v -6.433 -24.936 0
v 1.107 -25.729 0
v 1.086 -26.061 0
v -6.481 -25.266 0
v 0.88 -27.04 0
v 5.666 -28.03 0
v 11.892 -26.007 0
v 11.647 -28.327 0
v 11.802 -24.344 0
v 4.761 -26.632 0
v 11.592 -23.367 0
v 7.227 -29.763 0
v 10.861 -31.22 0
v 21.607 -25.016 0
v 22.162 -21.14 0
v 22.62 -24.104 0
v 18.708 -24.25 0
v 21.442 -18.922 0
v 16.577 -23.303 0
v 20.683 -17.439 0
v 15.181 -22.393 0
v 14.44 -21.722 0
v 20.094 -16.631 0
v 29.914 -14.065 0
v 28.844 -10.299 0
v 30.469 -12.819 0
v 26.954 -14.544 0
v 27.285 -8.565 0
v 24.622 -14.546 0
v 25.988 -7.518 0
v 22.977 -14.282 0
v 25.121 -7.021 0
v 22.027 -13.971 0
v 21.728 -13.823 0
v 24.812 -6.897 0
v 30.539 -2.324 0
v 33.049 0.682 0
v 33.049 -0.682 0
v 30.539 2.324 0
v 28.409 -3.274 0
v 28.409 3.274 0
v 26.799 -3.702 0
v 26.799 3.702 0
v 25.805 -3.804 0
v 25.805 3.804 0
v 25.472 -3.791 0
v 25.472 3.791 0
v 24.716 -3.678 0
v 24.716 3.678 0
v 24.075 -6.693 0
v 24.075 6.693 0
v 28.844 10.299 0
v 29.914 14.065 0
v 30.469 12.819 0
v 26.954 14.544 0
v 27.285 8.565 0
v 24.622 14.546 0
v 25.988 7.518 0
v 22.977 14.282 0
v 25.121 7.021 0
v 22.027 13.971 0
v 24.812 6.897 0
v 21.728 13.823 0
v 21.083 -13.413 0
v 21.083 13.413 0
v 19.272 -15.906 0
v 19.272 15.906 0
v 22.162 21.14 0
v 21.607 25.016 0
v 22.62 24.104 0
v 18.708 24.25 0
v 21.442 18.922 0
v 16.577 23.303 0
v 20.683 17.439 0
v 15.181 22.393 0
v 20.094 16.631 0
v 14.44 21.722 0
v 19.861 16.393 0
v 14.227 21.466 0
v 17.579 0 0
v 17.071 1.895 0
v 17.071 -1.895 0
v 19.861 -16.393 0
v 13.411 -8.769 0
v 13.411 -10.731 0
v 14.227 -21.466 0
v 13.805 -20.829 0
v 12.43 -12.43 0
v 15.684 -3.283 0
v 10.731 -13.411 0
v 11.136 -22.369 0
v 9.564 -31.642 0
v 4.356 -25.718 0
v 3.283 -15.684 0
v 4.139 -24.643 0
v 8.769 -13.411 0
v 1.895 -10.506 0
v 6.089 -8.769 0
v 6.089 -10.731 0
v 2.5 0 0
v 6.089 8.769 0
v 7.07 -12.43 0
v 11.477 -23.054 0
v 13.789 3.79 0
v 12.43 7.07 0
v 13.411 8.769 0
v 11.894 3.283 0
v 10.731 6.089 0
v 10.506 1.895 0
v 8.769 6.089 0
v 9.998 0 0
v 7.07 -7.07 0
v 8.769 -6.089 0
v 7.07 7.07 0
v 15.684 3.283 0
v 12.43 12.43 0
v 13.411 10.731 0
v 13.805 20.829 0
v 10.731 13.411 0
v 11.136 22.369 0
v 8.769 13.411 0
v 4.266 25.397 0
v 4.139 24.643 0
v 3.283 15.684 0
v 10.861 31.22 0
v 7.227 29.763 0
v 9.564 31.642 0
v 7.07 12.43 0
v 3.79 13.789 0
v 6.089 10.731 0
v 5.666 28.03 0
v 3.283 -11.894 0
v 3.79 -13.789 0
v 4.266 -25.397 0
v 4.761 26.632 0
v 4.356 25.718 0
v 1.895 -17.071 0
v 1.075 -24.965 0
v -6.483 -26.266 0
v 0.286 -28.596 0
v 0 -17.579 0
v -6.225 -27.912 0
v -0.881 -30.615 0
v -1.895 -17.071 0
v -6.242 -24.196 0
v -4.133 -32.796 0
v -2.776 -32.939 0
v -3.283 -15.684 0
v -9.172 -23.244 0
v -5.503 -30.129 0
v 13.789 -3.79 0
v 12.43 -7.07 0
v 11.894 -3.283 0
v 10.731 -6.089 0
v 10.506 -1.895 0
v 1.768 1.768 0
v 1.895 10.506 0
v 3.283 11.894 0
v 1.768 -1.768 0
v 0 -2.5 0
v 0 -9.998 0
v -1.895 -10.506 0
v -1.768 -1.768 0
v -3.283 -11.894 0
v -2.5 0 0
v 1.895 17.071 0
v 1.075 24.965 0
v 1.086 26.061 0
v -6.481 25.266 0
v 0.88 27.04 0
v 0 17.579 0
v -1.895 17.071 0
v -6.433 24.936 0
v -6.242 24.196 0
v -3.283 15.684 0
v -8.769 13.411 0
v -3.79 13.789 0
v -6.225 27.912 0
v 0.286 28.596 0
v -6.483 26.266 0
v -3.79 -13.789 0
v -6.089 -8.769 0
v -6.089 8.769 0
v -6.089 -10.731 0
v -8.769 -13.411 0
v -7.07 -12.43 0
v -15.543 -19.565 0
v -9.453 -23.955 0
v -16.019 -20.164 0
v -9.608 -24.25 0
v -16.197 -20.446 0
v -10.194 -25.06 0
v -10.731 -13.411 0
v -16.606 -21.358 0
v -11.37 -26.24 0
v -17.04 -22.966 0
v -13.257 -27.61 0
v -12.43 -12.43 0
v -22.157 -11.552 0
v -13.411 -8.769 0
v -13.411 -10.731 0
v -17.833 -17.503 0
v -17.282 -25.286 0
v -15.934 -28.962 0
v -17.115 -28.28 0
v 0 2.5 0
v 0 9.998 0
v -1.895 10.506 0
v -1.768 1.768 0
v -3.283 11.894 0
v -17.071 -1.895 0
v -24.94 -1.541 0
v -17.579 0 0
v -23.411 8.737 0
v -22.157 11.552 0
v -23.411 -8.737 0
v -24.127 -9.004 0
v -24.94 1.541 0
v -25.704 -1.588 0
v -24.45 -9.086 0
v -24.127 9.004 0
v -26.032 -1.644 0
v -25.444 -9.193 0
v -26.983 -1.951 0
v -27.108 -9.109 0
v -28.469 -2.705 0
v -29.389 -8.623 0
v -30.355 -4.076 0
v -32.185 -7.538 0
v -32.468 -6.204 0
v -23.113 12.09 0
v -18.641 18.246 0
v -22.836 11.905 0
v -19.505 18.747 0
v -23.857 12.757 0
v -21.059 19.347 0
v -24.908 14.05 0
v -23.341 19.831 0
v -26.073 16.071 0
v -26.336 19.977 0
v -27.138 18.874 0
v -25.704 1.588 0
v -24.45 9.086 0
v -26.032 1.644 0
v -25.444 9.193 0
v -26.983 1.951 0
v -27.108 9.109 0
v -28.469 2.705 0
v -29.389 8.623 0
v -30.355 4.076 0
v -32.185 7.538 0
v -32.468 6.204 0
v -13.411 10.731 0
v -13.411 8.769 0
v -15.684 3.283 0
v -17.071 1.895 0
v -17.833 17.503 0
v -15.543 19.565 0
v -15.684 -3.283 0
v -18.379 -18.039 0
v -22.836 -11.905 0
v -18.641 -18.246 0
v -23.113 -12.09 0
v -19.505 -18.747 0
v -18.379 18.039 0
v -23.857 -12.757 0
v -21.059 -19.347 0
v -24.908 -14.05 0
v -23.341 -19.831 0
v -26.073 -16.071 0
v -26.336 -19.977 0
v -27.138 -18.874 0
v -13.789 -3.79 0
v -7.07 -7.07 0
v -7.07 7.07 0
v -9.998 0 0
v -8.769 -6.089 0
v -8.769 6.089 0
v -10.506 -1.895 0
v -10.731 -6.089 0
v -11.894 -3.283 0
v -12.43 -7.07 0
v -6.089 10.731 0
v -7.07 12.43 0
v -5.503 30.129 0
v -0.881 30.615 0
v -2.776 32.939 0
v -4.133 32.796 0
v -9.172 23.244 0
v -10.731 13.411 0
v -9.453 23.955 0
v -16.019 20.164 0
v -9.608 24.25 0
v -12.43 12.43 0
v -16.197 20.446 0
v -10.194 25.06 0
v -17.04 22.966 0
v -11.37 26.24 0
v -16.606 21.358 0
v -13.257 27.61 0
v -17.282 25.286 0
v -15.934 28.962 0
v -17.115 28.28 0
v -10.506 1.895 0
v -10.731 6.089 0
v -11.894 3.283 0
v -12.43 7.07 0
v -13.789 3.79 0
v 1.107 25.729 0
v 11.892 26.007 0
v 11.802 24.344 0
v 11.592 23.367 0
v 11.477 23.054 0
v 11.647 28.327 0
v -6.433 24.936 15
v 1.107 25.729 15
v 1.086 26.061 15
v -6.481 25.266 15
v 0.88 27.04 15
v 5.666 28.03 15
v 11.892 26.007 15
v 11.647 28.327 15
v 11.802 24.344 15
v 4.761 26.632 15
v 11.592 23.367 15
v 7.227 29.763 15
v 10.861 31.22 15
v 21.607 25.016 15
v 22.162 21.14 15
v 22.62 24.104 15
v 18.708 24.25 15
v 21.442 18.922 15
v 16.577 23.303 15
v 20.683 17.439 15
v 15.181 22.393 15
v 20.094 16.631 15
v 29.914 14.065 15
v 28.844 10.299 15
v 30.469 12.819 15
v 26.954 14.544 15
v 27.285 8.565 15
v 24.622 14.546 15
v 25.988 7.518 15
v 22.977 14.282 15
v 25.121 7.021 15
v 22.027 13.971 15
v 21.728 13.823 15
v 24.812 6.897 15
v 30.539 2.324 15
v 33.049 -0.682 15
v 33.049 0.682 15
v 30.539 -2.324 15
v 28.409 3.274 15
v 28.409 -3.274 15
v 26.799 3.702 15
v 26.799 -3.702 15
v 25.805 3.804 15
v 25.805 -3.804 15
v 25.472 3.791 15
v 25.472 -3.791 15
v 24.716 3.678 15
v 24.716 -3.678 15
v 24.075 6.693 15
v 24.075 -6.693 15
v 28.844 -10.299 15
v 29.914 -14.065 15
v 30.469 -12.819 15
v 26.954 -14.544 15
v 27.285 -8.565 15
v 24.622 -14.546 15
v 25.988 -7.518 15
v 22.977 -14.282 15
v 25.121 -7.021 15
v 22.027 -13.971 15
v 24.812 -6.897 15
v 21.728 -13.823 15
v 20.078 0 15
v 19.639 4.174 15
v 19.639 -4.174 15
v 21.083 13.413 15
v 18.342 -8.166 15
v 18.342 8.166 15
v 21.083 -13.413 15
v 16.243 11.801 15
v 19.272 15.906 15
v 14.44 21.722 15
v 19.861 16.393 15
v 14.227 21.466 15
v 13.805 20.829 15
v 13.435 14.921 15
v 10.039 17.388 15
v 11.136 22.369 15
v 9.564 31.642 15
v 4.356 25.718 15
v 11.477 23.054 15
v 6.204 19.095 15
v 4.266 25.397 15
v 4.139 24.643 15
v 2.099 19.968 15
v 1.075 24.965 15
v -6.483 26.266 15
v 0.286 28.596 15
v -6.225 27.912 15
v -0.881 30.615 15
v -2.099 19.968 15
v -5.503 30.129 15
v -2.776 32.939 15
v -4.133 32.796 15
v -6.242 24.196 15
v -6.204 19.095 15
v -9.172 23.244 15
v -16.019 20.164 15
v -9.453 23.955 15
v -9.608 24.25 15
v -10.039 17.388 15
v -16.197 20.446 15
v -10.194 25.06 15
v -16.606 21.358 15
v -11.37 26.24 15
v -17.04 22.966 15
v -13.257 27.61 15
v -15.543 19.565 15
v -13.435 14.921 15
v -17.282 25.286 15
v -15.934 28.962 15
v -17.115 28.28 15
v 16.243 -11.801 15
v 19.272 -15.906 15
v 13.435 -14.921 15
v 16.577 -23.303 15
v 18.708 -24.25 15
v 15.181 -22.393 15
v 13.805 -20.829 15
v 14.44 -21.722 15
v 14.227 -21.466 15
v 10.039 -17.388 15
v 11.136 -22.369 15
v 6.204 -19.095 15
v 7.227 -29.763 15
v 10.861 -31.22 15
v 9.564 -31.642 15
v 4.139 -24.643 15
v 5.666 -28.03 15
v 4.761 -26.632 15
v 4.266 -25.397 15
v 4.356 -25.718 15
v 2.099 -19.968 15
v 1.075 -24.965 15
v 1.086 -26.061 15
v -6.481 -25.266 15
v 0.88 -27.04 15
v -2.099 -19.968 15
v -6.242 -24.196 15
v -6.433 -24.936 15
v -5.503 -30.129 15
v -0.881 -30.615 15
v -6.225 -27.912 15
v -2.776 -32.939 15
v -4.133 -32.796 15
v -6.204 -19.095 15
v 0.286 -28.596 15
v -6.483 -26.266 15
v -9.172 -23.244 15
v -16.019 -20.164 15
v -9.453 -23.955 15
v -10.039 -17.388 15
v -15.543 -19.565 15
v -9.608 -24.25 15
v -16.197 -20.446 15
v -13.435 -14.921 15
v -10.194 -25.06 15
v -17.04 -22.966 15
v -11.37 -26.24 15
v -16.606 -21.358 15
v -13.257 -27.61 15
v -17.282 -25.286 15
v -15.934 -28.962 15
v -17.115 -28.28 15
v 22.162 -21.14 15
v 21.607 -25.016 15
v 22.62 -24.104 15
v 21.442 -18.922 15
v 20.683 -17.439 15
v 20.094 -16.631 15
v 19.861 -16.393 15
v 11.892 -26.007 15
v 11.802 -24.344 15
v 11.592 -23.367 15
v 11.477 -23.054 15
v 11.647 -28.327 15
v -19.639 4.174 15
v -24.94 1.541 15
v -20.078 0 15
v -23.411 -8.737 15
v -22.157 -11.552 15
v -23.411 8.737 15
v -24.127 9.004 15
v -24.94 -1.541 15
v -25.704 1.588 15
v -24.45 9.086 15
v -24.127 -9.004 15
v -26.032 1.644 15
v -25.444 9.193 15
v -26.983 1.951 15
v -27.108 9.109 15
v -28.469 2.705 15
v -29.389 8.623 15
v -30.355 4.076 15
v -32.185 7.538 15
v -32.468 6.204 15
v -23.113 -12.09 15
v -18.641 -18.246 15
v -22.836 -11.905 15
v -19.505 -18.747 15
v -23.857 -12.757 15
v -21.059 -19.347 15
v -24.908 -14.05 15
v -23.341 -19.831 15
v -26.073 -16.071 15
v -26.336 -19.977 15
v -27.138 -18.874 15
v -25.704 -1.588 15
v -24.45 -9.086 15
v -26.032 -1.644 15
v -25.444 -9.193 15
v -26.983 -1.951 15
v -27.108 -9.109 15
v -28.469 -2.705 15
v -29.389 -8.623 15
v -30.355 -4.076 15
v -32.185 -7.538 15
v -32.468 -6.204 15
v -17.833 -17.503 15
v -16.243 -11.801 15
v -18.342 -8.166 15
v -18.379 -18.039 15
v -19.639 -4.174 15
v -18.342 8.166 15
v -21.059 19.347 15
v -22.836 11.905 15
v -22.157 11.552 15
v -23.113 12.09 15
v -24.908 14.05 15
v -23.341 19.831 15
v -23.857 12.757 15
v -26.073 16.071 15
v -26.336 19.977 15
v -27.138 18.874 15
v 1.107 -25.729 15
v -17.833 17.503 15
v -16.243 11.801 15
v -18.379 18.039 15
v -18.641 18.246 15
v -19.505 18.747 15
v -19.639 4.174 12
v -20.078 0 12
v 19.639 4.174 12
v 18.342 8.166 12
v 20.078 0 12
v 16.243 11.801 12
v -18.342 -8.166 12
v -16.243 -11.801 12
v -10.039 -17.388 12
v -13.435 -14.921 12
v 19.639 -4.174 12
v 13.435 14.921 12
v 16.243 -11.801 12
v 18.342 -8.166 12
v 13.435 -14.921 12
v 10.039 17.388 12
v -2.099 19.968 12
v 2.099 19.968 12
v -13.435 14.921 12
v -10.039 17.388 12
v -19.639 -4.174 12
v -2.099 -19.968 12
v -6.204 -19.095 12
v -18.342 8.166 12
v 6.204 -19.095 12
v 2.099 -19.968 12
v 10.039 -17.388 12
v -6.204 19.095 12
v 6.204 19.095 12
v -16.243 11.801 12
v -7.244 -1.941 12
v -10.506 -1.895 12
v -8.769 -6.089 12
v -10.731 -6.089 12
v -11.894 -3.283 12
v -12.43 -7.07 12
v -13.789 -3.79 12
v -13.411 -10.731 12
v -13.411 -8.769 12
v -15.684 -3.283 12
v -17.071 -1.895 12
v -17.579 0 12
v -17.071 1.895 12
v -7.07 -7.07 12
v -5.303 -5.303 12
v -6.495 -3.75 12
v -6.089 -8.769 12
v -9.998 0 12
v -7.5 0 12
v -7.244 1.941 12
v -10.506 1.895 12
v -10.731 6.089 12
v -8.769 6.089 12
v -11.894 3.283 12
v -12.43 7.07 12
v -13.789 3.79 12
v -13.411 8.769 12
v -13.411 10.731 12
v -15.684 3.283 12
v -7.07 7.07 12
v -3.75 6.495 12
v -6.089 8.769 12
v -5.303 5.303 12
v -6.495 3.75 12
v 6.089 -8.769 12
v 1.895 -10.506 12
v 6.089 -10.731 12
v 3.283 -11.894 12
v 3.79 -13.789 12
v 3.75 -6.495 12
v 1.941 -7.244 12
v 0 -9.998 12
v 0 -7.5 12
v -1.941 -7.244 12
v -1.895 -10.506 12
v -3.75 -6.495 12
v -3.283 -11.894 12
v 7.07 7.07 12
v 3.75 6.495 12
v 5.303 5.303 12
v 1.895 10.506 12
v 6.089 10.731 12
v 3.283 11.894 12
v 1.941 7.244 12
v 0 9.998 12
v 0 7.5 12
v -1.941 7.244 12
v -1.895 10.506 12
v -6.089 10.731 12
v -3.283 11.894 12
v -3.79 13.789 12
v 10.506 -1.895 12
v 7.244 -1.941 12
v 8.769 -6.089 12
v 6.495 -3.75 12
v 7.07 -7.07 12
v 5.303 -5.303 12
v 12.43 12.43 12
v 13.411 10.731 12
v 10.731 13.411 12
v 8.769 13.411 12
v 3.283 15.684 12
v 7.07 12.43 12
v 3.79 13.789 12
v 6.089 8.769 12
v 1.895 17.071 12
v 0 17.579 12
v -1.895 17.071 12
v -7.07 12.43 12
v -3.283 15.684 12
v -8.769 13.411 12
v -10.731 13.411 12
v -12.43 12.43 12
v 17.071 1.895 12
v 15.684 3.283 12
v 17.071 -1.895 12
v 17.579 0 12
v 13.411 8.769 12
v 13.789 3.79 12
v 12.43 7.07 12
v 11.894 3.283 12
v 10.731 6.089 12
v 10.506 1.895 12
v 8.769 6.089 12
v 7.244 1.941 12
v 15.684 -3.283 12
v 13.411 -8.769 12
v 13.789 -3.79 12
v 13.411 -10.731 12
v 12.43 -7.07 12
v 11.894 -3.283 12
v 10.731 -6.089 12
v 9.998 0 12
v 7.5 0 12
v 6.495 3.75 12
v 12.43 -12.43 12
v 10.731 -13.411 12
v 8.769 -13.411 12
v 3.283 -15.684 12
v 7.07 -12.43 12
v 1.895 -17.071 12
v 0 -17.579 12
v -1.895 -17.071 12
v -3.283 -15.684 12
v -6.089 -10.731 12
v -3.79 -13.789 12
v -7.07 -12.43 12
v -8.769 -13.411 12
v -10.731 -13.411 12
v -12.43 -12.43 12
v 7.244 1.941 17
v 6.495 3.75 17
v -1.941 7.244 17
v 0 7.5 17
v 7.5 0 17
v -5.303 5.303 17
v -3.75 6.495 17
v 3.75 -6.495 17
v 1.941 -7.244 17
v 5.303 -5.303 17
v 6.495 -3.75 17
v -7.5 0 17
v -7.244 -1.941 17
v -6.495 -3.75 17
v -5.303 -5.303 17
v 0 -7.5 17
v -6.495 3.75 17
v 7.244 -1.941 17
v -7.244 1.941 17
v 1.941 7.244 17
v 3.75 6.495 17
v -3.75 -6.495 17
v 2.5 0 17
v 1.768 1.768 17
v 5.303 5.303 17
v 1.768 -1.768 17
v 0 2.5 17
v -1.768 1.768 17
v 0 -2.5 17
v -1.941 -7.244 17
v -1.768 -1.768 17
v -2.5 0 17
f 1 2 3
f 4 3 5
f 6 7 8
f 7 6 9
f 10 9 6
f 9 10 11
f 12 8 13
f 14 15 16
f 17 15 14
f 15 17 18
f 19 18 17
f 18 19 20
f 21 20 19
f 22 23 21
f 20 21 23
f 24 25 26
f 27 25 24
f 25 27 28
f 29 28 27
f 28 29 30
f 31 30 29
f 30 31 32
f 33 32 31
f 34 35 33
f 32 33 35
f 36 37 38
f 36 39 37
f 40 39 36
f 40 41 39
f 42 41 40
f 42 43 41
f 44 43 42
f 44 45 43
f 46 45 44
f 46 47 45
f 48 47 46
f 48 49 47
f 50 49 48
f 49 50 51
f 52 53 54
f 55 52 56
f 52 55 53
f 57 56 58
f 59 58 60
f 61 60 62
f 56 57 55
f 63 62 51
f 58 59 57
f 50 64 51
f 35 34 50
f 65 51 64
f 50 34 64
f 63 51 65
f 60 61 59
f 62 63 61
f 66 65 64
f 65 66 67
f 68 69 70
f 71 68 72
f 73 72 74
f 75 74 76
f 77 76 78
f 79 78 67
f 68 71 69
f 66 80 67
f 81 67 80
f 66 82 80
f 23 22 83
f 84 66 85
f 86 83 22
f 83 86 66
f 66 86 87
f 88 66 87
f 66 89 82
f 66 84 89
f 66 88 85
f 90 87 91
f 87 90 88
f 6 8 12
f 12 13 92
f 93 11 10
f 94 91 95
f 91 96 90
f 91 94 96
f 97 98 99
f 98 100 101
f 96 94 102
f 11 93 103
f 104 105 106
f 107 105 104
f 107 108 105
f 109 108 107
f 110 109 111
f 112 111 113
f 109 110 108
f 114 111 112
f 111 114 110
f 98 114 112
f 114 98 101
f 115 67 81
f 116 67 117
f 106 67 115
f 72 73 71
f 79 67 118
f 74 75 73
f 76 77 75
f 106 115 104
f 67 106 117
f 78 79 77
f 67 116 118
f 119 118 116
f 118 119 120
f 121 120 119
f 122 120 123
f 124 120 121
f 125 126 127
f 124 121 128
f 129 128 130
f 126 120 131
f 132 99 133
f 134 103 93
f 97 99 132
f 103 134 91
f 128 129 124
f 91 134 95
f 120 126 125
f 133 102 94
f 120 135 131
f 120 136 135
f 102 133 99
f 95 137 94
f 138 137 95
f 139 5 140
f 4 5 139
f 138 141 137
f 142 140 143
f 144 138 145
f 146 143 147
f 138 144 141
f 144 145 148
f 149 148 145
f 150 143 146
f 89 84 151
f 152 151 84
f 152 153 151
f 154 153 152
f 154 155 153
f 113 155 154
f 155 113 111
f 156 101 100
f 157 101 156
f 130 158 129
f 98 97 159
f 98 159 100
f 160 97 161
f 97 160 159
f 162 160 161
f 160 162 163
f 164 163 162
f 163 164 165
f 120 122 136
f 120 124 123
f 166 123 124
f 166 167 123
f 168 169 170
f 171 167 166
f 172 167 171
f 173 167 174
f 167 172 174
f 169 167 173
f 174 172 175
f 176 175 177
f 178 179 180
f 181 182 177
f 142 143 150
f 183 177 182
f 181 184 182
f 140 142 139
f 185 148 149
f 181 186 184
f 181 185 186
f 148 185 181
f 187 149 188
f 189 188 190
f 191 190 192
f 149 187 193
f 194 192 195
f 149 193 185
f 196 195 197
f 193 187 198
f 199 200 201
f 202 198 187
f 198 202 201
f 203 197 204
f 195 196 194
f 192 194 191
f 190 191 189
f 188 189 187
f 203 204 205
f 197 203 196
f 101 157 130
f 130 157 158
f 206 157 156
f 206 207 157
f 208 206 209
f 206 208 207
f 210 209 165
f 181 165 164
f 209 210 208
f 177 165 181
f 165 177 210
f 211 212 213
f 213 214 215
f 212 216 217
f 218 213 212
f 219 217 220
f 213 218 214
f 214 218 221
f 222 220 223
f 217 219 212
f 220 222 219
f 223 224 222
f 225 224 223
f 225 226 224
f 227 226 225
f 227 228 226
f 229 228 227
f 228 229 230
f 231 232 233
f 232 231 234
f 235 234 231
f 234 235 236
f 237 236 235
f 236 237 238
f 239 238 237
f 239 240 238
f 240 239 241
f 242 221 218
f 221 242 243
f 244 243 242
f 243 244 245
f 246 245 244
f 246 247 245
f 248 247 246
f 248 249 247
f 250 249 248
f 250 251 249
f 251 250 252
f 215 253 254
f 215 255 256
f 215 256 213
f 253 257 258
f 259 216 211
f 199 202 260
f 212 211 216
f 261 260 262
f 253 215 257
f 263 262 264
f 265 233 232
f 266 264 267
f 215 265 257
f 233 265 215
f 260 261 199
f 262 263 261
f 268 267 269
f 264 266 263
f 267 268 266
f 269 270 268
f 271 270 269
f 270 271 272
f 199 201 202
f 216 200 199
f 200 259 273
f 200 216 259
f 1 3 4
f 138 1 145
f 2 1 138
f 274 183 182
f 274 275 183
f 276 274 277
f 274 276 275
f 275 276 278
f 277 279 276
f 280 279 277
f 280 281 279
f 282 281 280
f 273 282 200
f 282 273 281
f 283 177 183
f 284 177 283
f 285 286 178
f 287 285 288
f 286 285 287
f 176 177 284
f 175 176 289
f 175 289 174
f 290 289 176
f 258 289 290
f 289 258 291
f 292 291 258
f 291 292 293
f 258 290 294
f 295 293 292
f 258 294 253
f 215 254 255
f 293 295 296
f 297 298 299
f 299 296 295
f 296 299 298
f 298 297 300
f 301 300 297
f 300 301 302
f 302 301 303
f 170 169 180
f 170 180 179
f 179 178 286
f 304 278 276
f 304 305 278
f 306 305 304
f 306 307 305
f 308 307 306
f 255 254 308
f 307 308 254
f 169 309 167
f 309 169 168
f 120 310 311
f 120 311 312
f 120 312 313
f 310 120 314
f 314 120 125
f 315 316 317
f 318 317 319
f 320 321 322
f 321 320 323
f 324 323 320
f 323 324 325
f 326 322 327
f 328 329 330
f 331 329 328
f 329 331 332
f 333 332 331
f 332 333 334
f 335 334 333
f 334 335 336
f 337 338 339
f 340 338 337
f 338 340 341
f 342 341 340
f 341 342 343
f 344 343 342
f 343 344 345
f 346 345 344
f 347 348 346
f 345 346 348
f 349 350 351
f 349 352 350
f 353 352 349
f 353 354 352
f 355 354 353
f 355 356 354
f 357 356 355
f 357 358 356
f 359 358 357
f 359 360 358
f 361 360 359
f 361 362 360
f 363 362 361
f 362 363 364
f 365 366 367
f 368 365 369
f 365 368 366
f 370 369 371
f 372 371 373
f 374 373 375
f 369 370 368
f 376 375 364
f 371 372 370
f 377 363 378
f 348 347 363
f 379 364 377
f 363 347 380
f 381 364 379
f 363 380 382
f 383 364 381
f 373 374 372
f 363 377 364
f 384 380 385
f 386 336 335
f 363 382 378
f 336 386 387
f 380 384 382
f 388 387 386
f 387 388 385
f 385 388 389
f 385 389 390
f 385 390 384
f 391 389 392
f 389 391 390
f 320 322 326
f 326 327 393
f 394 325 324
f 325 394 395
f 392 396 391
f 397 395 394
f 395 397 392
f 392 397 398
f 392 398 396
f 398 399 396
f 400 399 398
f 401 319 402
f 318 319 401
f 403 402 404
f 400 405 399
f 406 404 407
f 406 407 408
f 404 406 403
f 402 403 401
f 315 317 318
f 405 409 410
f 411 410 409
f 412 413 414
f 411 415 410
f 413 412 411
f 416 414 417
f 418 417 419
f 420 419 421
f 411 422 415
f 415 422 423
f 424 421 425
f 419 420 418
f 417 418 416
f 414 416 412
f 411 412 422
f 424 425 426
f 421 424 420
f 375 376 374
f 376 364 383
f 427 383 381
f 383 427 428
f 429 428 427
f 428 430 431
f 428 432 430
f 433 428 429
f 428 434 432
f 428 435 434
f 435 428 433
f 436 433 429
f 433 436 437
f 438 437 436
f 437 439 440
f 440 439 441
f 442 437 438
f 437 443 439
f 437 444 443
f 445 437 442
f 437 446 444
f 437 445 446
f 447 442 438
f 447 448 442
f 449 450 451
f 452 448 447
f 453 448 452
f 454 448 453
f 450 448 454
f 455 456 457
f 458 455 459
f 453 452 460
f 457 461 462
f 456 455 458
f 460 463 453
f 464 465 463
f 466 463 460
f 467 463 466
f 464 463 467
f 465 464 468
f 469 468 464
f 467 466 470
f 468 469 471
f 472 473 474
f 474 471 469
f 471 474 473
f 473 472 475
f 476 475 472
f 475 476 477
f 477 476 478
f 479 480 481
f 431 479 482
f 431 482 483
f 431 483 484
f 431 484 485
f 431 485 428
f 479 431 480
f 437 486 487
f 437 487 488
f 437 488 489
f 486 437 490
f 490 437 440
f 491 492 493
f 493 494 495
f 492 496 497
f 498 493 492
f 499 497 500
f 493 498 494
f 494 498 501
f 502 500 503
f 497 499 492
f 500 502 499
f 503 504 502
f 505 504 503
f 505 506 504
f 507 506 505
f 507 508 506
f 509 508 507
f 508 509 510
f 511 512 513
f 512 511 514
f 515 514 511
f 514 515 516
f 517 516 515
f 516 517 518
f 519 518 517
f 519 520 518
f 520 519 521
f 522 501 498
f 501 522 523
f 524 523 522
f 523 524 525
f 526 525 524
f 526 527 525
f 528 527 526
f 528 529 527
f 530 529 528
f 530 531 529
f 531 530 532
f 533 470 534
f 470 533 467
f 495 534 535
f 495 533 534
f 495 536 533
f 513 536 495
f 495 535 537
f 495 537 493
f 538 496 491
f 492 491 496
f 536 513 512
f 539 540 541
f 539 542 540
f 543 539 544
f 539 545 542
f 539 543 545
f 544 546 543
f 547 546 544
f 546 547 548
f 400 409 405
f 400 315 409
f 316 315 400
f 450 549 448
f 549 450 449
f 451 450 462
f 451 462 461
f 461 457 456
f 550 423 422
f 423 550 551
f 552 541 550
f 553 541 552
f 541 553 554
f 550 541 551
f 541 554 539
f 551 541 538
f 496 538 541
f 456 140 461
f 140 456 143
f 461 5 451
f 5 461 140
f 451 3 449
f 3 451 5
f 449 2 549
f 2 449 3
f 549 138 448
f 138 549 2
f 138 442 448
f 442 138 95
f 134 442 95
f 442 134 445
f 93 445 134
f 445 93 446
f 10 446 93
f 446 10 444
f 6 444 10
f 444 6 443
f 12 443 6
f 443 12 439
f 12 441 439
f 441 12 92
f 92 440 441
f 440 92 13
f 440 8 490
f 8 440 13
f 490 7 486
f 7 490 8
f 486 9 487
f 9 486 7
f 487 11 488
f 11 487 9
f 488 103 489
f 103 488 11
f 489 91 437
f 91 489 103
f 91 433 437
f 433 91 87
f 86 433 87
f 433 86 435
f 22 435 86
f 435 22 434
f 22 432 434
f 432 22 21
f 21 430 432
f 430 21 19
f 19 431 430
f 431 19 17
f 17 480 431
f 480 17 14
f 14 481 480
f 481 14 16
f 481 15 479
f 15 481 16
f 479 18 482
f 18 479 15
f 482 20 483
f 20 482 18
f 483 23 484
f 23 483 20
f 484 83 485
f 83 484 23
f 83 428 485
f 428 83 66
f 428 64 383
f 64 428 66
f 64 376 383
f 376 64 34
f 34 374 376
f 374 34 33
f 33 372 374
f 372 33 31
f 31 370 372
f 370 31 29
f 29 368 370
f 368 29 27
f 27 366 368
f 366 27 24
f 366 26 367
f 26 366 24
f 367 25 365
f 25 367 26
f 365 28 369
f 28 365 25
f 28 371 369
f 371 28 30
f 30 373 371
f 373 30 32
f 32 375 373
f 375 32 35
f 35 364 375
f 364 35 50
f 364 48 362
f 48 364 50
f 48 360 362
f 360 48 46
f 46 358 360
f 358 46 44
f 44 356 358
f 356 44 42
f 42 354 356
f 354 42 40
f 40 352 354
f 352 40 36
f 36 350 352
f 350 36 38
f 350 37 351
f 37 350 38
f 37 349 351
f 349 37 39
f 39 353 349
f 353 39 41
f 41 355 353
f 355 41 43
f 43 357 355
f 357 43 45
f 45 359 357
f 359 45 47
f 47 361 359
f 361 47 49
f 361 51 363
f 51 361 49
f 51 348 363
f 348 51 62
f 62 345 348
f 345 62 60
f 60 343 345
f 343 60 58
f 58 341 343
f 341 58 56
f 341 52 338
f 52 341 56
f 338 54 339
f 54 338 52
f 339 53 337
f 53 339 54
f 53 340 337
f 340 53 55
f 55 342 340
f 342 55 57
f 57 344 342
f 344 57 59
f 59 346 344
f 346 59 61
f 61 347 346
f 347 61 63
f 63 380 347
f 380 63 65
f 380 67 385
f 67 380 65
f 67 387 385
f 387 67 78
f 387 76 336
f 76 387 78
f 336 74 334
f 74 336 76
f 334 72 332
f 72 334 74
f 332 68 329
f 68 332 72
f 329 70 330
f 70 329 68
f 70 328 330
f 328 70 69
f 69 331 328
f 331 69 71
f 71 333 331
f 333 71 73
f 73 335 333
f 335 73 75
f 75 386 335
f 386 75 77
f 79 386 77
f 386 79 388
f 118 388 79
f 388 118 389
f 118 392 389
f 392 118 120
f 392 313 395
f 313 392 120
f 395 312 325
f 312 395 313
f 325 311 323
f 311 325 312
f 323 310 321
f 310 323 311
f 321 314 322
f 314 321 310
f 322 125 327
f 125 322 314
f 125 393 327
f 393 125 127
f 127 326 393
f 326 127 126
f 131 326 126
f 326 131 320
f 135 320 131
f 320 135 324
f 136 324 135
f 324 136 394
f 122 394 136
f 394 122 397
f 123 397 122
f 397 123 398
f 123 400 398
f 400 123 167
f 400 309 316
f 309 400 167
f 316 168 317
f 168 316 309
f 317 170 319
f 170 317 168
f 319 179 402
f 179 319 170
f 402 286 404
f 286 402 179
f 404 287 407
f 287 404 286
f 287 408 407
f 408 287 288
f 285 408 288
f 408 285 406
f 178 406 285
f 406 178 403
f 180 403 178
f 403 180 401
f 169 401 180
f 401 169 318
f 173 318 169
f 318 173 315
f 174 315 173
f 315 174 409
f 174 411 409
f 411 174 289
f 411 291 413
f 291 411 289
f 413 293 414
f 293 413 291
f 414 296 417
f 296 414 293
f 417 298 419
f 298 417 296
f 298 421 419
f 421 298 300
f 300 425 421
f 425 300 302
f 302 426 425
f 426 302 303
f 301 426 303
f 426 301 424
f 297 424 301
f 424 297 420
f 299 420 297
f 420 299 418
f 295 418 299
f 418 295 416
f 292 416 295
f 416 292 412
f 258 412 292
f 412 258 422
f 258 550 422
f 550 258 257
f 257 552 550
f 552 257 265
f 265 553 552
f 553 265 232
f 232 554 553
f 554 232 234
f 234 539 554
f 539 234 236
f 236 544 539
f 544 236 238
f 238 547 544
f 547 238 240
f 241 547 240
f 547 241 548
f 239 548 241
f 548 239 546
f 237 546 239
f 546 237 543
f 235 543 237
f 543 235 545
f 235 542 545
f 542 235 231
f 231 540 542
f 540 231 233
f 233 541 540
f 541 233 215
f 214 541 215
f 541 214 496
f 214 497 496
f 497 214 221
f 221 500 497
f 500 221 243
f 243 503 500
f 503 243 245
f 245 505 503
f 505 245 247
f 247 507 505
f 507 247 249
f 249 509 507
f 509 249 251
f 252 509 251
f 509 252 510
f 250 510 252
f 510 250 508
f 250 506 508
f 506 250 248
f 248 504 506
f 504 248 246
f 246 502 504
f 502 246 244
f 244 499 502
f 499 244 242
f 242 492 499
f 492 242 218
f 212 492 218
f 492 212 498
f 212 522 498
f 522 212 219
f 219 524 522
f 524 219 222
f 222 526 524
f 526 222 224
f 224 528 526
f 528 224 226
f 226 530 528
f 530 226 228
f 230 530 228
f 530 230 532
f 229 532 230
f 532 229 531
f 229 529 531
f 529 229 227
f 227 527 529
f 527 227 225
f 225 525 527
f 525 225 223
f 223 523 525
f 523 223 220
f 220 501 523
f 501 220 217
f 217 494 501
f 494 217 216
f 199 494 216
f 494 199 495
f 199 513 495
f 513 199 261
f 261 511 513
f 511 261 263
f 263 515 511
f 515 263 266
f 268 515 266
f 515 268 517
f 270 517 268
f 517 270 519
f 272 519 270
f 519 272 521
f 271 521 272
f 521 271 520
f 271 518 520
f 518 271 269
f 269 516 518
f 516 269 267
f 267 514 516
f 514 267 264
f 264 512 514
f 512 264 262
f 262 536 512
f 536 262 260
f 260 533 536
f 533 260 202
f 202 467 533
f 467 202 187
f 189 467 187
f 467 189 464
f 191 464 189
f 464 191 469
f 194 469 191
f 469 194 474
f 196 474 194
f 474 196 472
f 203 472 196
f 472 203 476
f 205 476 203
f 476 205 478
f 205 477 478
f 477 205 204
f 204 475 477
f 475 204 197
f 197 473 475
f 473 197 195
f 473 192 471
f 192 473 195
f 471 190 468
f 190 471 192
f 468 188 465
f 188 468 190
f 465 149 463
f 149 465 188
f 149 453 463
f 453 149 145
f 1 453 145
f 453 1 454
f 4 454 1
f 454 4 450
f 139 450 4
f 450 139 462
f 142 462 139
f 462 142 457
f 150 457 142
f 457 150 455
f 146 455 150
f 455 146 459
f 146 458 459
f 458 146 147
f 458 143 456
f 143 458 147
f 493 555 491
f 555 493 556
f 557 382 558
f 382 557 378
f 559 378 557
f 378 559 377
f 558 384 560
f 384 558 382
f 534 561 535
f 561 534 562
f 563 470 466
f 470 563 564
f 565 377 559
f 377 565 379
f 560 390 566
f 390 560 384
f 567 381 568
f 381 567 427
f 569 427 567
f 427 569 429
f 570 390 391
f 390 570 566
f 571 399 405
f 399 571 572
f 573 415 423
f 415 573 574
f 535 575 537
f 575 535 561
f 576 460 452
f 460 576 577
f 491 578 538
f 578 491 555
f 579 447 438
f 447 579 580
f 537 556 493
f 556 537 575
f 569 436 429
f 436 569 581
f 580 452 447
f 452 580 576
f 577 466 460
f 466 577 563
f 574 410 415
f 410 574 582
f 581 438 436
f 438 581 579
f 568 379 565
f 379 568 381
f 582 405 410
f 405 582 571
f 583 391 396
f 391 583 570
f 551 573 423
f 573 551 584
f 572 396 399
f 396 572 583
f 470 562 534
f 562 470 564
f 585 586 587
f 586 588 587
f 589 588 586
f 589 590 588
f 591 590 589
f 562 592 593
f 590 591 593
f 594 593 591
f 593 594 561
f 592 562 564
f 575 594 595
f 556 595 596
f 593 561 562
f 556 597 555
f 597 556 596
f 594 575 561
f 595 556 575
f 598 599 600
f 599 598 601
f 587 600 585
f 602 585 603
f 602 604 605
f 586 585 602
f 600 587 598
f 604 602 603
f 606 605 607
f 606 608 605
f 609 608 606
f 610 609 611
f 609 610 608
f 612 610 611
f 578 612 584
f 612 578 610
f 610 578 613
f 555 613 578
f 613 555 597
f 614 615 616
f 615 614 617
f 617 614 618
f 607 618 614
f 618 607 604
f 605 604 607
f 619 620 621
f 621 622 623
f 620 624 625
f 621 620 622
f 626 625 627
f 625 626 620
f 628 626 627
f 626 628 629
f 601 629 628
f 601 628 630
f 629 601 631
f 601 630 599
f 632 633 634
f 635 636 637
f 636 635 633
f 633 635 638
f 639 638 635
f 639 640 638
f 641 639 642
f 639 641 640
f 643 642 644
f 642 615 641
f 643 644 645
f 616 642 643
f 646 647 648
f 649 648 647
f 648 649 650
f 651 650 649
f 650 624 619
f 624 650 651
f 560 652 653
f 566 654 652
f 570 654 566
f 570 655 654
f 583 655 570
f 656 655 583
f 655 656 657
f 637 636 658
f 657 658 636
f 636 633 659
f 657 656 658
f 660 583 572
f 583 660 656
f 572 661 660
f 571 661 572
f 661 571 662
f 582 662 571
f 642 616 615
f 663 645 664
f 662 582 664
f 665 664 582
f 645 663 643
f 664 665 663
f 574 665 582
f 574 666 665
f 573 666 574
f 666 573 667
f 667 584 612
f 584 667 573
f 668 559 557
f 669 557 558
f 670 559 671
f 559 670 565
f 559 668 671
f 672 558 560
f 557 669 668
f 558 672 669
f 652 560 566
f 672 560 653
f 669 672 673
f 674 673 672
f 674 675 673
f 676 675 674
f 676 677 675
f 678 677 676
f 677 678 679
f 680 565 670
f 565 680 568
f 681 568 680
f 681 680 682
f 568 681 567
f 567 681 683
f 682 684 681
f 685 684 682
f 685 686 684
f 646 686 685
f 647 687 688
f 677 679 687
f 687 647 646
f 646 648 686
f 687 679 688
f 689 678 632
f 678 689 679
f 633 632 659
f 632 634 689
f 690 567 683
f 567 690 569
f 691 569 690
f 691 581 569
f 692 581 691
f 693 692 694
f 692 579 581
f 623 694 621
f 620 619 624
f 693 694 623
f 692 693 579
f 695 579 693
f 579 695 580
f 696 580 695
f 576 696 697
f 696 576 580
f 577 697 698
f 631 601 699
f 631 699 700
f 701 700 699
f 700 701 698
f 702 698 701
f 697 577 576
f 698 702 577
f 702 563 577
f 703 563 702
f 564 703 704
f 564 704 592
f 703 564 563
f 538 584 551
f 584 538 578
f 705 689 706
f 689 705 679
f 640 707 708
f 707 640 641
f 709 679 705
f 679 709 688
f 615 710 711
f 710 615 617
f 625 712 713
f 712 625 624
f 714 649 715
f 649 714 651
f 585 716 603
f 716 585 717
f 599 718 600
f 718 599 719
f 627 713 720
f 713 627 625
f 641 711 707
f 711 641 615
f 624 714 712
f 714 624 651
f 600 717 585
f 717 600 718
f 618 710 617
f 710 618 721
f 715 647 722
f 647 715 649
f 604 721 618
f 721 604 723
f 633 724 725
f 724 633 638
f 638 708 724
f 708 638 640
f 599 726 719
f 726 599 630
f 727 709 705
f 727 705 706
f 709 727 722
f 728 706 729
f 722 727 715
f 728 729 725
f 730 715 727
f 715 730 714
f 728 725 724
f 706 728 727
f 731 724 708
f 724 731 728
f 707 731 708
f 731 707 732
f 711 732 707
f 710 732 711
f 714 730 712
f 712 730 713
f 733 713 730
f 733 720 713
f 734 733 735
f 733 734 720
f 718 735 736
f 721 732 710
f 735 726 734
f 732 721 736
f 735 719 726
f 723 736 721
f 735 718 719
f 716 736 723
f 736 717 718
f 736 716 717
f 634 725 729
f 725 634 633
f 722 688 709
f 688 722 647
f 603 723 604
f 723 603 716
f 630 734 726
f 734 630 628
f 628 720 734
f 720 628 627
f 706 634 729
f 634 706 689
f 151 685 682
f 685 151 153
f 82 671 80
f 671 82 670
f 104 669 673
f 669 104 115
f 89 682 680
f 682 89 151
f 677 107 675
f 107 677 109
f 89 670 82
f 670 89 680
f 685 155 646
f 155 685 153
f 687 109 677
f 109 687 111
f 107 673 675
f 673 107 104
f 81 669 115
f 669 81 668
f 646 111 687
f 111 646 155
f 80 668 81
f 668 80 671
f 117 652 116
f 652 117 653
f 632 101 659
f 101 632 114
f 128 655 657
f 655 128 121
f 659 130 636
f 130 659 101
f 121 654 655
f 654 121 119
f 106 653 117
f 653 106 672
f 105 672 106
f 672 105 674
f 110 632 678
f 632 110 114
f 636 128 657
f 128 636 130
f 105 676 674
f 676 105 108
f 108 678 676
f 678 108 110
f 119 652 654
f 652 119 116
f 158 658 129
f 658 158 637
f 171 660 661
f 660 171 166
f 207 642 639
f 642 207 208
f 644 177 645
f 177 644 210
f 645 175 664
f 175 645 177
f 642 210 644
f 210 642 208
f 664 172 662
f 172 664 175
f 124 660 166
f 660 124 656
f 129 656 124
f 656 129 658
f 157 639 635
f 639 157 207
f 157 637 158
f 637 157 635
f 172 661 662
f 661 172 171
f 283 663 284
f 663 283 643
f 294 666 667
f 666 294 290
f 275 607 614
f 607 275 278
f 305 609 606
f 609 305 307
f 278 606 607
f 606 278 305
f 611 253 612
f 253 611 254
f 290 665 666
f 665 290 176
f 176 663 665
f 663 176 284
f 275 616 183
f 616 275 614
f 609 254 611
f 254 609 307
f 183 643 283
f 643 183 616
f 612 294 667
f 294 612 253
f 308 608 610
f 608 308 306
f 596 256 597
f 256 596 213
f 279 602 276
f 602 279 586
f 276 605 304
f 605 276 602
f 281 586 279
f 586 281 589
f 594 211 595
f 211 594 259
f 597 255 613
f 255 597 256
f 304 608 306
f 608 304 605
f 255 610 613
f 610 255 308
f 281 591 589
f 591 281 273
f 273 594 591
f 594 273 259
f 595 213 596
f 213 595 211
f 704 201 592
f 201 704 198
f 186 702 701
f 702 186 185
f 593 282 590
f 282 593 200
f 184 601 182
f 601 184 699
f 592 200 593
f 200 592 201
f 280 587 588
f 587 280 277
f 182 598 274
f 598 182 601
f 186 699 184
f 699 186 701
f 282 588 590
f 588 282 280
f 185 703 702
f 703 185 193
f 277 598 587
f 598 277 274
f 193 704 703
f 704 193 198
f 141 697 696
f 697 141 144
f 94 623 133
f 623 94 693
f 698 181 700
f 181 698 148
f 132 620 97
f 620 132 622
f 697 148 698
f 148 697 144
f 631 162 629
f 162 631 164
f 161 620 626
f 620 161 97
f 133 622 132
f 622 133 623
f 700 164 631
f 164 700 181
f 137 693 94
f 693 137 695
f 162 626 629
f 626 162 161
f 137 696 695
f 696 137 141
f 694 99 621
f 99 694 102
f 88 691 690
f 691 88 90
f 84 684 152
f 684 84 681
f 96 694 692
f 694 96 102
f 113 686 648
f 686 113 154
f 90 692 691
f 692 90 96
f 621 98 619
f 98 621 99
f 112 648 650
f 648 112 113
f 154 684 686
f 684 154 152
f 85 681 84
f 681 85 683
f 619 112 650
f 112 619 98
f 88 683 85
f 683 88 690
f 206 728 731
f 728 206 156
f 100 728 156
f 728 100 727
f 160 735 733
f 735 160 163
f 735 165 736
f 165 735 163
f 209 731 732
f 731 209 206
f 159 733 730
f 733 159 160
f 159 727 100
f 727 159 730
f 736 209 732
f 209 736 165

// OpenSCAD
// Parametric Involute Bevel and Spur Gears by GregFrost
// It is licensed under the Creative Commons - GNU LGPL 2.1 license.
// © 2010 by GregFrost, thingiverse.com/Amp
// http://www.thingiverse.com/thing:3575 and http://www.thingiverse.com/thing:3752

// Simple Test:
gear (circular_pitch=700,
	gear_thickness = 12,
	rim_thickness = 15,
	hub_thickness = 17,
	circles=8);

//Complex Spur Gear Test:
//test_gears ();

// Meshing Double Helix:
//test_meshing_double_helix ();

module test_meshing_double_helix(){
    meshing_double_helix ();
}

// Demonstrate the backlash option for Spur gears.
//test_backlash ();

// Demonstrate how to make meshing bevel gears.
//test_bevel_gear_pair();

module test_bevel_gear_pair(){
    bevel_gear_pair ();
}

module test_bevel_gear(){bevel_gear();}

//bevel_gear();

pi=3.1415926535897932384626433832795;

//==================================================
// Bevel Gears:
// Two gears with the same cone distance, circular pitch (measured at the cone distance)
// and pressure angle will mesh.

module bevel_gear_pair (
	gear1_teeth = 41,
	gear2_teeth = 7,
	axis_angle = 90,
	outside_circular_pitch=1000)
{
	outside_pitch_radius1 = gear1_teeth * outside_circular_pitch / 360;
	outside_pitch_radius2 = gear2_teeth * outside_circular_pitch / 360;
	pitch_apex1=outside_pitch_radius2 * sin (axis_angle) +
		(outside_pitch_radius2 * cos (axis_angle) + outside_pitch_radius1) / tan (axis_angle);
	cone_distance = sqrt (pow (pitch_apex1, 2) + pow (outside_pitch_radius1, 2));
	pitch_apex2 = sqrt (pow (cone_distance, 2) - pow (outside_pitch_radius2, 2));
	echo ("cone_distance", cone_distance);
	pitch_angle1 = asin (outside_pitch_radius1 / cone_distance);
	pitch_angle2 = asin (outside_pitch_radius2 / cone_distance);
	echo ("pitch_angle1, pitch_angle2", pitch_angle1, pitch_angle2);
	echo ("pitch_angle1 + pitch_angle2", pitch_angle1 + pitch_angle2);

	rotate([0,0,90])
	translate ([0,0,pitch_apex1+20])
	{
		translate([0,0,-pitch_apex1])
		bevel_gear (
			number_of_teeth=gear1_teeth,
			cone_distance=cone_distance,
			pressure_angle=30,
			outside_circular_pitch=outside_circular_pitch);

		rotate([0,-(pitch_angle1+pitch_angle2),0])
		translate([0,0,-pitch_apex2])
		bevel_gear (
			number_of_teeth=gear2_teeth,
			cone_distance=cone_distance,
			pressure_angle=30,
			outside_circular_pitch=outside_circular_pitch);
	}
}

//Bevel Gear Finishing Options:
bevel_gear_flat = 0;
bevel_gear_back_cone = 1;

module bevel_gear (
	number_of_teeth=11,
	cone_distance=100,
	face_width=20,
	outside_circular_pitch=1000,
	pressure_angle=30,
	clearance = 0.2,
	bore_diameter=5,
	gear_thickness = 15,
	backlash = 0,
	involute_facets=0,
	finish = -1)
{
	echo ("bevel_gear",
		"teeth", number_of_teeth,
		"cone distance", cone_distance,
		face_width,
		outside_circular_pitch,
		pressure_angle,
		clearance,
		bore_diameter,
		involute_facets,
		finish);

	// Pitch diameter: Diameter of pitch circle at the fat end of the gear.
	outside_pitch_diameter  =  number_of_teeth * outside_circular_pitch / 180;
	outside_pitch_radius = outside_pitch_diameter / 2;

	// The height of the pitch apex.
	pitch_apex = sqrt (pow (cone_distance, 2) - pow (outside_pitch_radius, 2));
	pitch_angle = asin (outside_pitch_radius/cone_distance);

	echo ("Num Teeth:", number_of_teeth, " Pitch Angle:", pitch_angle);

	finish = (finish != -1) ? finish : (pitch_angle < 45) ? bevel_gear_flat : bevel_gear_back_cone;

	apex_to_apex=cone_distance / cos (pitch_angle);
	back_cone_radius = apex_to_apex * sin (pitch_angle);

	// Calculate and display the pitch angle. This is needed to determine the angle to mount two meshing cone gears.

	// Base Circle for forming the involute teeth shape.
	base_radius = back_cone_radius * cos (pressure_angle);

	// Diametrial pitch: Number of teeth per unit length.
	pitch_diametrial = number_of_teeth / outside_pitch_diameter;

	// Addendum: Radial distance from pitch circle to outside circle.
	addendum = 1 / pitch_diametrial;
	// Outer Circle
	outer_radius = back_cone_radius + addendum;

	// Dedendum: Radial distance from pitch circle to root diameter
	dedendum = addendum + clearance;
	dedendum_angle = atan (dedendum / cone_distance);
	root_angle = pitch_angle - dedendum_angle;

	root_cone_full_radius = tan (root_angle)*apex_to_apex;
	back_cone_full_radius=apex_to_apex / tan (pitch_angle);

	back_cone_end_radius =
		outside_pitch_radius -
		dedendum * cos (pitch_angle) -
		gear_thickness / tan (pitch_angle);
	back_cone_descent = dedendum * sin (pitch_angle) + gear_thickness;

	// Root diameter: Diameter of bottom of tooth spaces.
	root_radius = back_cone_radius - dedendum;

	half_tooth_thickness = outside_pitch_radius * sin (360 / (4 * number_of_teeth)) - backlash / 4;
	half_thick_angle = asin (half_tooth_thickness / back_cone_radius);

	face_cone_height = apex_to_apex-face_width / cos (pitch_angle);
	face_cone_full_radius = face_cone_height / tan (pitch_angle);
	face_cone_descent = dedendum * sin (pitch_angle);
	face_cone_end_radius =
		outside_pitch_radius -
		face_width / sin (pitch_angle) -
		face_cone_descent / tan (pitch_angle);

	// For the bevel_gear_flat finish option, calculate the height of a cube to select the portion of the gear that includes the full pitch face.
	bevel_gear_flat_height = pitch_apex - (cone_distance - face_width) * cos (pitch_angle);

//	translate([0,0,-pitch_apex])
	difference ()
	{
		intersection ()
		{
			union()
			{
				rotate (half_thick_angle)
				translate ([0,0,pitch_apex-apex_to_apex])
				cylinder ($fn=number_of_teeth*2, r1=root_cone_full_radius,r2=0,h=apex_to_apex);
				for (i = [1:number_of_teeth])
//				for (i = [1:1])
				{
					rotate ([0,0,i*360/number_of_teeth])
					{
						involute_bevel_gear_tooth (
							back_cone_radius = back_cone_radius,
							root_radius = root_radius,
							base_radius = base_radius,
							outer_radius = outer_radius,
							pitch_apex = pitch_apex,
							cone_distance = cone_distance,
							half_thick_angle = half_thick_angle,
							involute_facets = involute_facets);
					}
				}
			}

			if (finish == bevel_gear_back_cone)
			{
				translate ([0,0,-back_cone_descent])
				cylinder (
					$fn=number_of_teeth*2,
					r1=back_cone_end_radius,
					r2=back_cone_full_radius*2,
					h=apex_to_apex + back_cone_descent);
			}
			else
			{
				translate ([-1.5*outside_pitch_radius,-1.5*outside_pitch_radius,0])
				cube ([3*outside_pitch_radius,
					3*outside_pitch_radius,
					bevel_gear_flat_height]);
			}
		}

		if (finish == bevel_gear_back_cone)
		{
			translate ([0,0,-face_cone_descent])
			cylinder (
				r1=face_cone_end_radius,
				r2=face_cone_full_radius * 2,
				h=face_cone_height + face_cone_descent+pitch_apex);
		}

		translate ([0,0,pitch_apex - apex_to_apex])
		cylinder (r=bore_diameter/2,h=apex_to_apex);
	}
}

module involute_bevel_gear_tooth (
	back_cone_radius,
	root_radius,
	base_radius,
	outer_radius,
	pitch_apex,
	cone_distance,
	half_thick_angle,
	involute_facets)
{
//	echo ("involute_bevel_gear_tooth",
//		back_cone_radius,
//		root_radius,
//		base_radius,
//		outer_radius,
//		pitch_apex,
//		cone_distance,
//		half_thick_angle);

	min_radius = max (base_radius*2,root_radius*2);

	pitch_point =
		involute (
			base_radius*2,
			involute_intersect_angle (base_radius*2, back_cone_radius*2));
	pitch_angle = atan2 (pitch_point[1], pitch_point[0]);
	centre_angle = pitch_angle + half_thick_angle;

	start_angle = involute_intersect_angle (base_radius*2, min_radius);
	stop_angle = involute_intersect_angle (base_radius*2, outer_radius*2);

	res=(involute_facets!=0)?involute_facets:($fn==0)?5:$fn/4;

	translate ([0,0,pitch_apex])
	rotate ([0,-atan(back_cone_radius/cone_distance),0])
	translate ([-back_cone_radius*2,0,-cone_distance*2])
	union ()
	{
		for (i=[1:res])
		{
			assign (
				point1=
					involute (base_radius*2,start_angle+(stop_angle - start_angle)*(i-1)/res),
				point2=
					involute (base_radius*2,start_angle+(stop_angle - start_angle)*(i)/res))
			{
				assign (
					side1_point1 = rotate_point (centre_angle, point1),
					side1_point2 = rotate_point (centre_angle, point2),
					side2_point1 = mirror_point (rotate_point (centre_angle, point1)),
					side2_point2 = mirror_point (rotate_point (centre_angle, point2)))
				{
					polyhedron (
						points=[
							[back_cone_radius*2+0.1,0,cone_distance*2],
							[side1_point1[0],side1_point1[1],0],
							[side1_point2[0],side1_point2[1],0],
							[side2_point2[0],side2_point2[1],0],
							[side2_point1[0],side2_point1[1],0],
							[0.1,0,0]],
						triangles=[[0,2,1],[0,3,2],[0,4,3],[0,1,5],[1,2,5],[2,3,5],[3,4,5],[0,5,4]]);
				}
			}
		}
	}
}

module gear (
	number_of_teeth=15,
	circular_pitch=false, diametral_pitch=false,
	pressure_angle=28,
	clearance = 0.2,
	gear_thickness=5,
	rim_thickness=8,
	rim_width=5,
	hub_thickness=10,
	hub_diameter=15,
	bore_diameter=5,
	circles=0,
	backlash=0,
	twist=0,
	involute_facets=0,
	flat=false)
{
	if (circular_pitch==false && diametral_pitch==false)
		echo("MCAD ERROR: gear module needs either a diametral_pitch or circular_pitch");

	//Convert diametrial pitch to our native circular pitch
	circular_pitch = (circular_pitch!=false?circular_pitch:180/diametral_pitch);

	// Pitch diameter: Diameter of pitch circle.
	pitch_diameter  =  number_of_teeth * circular_pitch / 180;
	pitch_radius = pitch_diameter/2;
	echo ("Teeth:", number_of_teeth, " Pitch radius:", pitch_radius);

	// Base Circle
	base_radius = pitch_radius*cos(pressure_angle);

	// Diametrial pitch: Number of teeth per unit length.
	pitch_diametrial = number_of_teeth / pitch_diameter;

	// Addendum: Radial distance from pitch circle to outside circle.
	addendum = 1/pitch_diametrial;

	//Outer Circle
	outer_radius = pitch_radius+addendum;

	// Dedendum: Radial distance from pitch circle to root diameter
	dedendum = addendum + clearance;

	// Root diameter: Diameter of bottom of tooth spaces.
	root_radius = pitch_radius-dedendum;
	backlash_angle = backlash / pitch_radius * 180 / pi;
	half_thick_angle = (360 / number_of_teeth - backlash_angle) / 4;

	// Variables controlling the rim.
	rim_radius = root_radius - rim_width;

	// Variables controlling the circular holes in the gear.
	circle_orbit_diameter=hub_diameter/2+rim_radius;
	circle_orbit_curcumference=pi*circle_orbit_diameter;

	// Limit the circle size to 90% of the gear face.
	circle_diameter=
		min (
			0.70*circle_orbit_curcumference/circles,
			(rim_radius-hub_diameter/2)*0.9);

	difference()
	{
		union ()
		{
			difference ()
			{
				linear_extrude_flat_option(flat=flat, height=rim_thickness, convexity=10, twist=twist)
				gear_shape (
					number_of_teeth,
					pitch_radius = pitch_radius,
					root_radius = root_radius,
					base_radius = base_radius,
					outer_radius = outer_radius,
					half_thick_angle = half_thick_angle,
					involute_facets=involute_facets);

				if (flat == false && gear_thickness < rim_thickness)
					translate ([0,0,gear_thickness])
					cylinder (r=rim_radius,h=rim_thickness-gear_thickness+1);
			}
			if (gear_thickness > rim_thickness)
				linear_extrude_flat_option(flat=flat, height=gear_thickness)
				circle (r=rim_radius);
			if (flat == false && hub_thickness > gear_thickness)
				translate ([0,0,gear_thickness])
				linear_extrude_flat_option(flat=flat, height=hub_thickness-gear_thickness)
				circle (r=hub_diameter/2);
		}
		translate ([0,0,-1])
		linear_extrude_flat_option(flat =flat, height=2+max(rim_thickness,hub_thickness,gear_thickness))
		circle (r=bore_diameter/2);
		if (circles>0)
		{
			for(i=[0:circles-1])
				rotate([0,0,i*360/circles])
				translate([circle_orbit_diameter/2,0,-1])
				linear_extrude_flat_option(flat =flat, height=max(gear_thickness,rim_thickness)+3)
				circle(r=circle_diameter/2);
		}
	}
}

module rack(
		number_of_teeth=15,
		circular_pitch=false, diametral_pitch=false,
		pressure_angle=28,
		clearance=0.2,
		rim_thickness=8,
		rim_width=5,
		flat=false)
{

	if (circular_pitch==false && diametral_pitch==false)
		echo("MCAD ERROR: gear module needs either a diametral_pitch or circular_pitch");

	//Convert diametrial pitch to our native circular pitch
	circular_pitch = (circular_pitch!=false?circular_pitch:180/diametral_pitch);
	pitch = circular_pitch / 180 * PI;

	addendum = circular_pitch / 180;
	dedendum = addendum + clearance;
	pitch_slope = tan(pressure_angle);

	linear_extrude_flat_option(flat=flat, height=rim_thickness)
		union()
		{
			translate([0,-dedendum-rim_width/2])
				square([number_of_teeth*pitch, rim_width],center=true);

			p1 = pitch / 4 + pitch_slope * dedendum;
			p2 = pitch / 4 - pitch_slope * addendum;
			for(i=[1:number_of_teeth])
				translate([pitch*(i-number_of_teeth/2-0.5),0])
					polygon(points=[
							[-p1,-dedendum],
							[p1,-dedendum],
							[p2,addendum],
							[-p2,addendum]
					]);
		}
}

module linear_extrude_flat_option(flat =false, height = 10, center = false, convexity = 2, twist = 0)
{
	if(flat==false)
	{
		linear_extrude(height = height, center = center, convexity = convexity, twist= twist) children(0);
	}
	else
	{
		children(0);
	}

}

module gear_shape (
	number_of_teeth,
	pitch_radius,
	root_radius,
	base_radius,
	outer_radius,
	half_thick_angle,
	involute_facets)
{
	union()
	{
		rotate (half_thick_angle) circle ($fn=number_of_teeth*2, r=root_radius);

		for (i = [1:number_of_teeth])
		{
			rotate ([0,0,i*360/number_of_teeth])
			{
				involute_gear_tooth (
					pitch_radius = pitch_radius,
					root_radius = root_radius,
					base_radius = base_radius,
					outer_radius = outer_radius,
					half_thick_angle = half_thick_angle,
					involute_facets=involute_facets);
			}
		}
	}
}

module involute_gear_tooth (
	pitch_radius,
	root_radius,
	base_radius,
	outer_radius,
	half_thick_angle,
	involute_facets)
{
	min_radius = max (base_radius,root_radius);

	pitch_point = involute (base_radius, involute_intersect_angle (base_radius, pitch_radius));
	pitch_angle = atan2 (pitch_point[1], pitch_point[0]);
	centre_angle = pitch_angle + half_thick_angle;

	start_angle = involute_intersect_angle (base_radius, min_radius);
	stop_angle = involute_intersect_angle (base_radius, outer_radius);

	res=(involute_facets!=0)?involute_facets:($fn==0)?5:$fn/4;

	union ()
	{
		for (i=[1:res]) {
			point1=involute (base_radius,start_angle+(stop_angle - start_angle)*(i-1)/res);
			point2=involute (base_radius,start_angle+(stop_angle - start_angle)*i/res);
			side1_point1=rotate_point (centre_angle, point1);
			side1_point2=rotate_point (centre_angle, point2);
			side2_point1=mirror_point (rotate_point (centre_angle, point1));
			side2_point2=mirror_point (rotate_point (centre_angle, point2));
			polygon (
				points=[[0,0],side1_point1,side1_point2,side2_point2,side2_point1],
				paths=[[0,1,2,3,4,0]]);
		}
	}
}

// Mathematical Functions
//===============

// Finds the angle of the involute about the base radius at the given distance (radius) from it's center.
//source: http://www.mathhelpforum.com/math-help/geometry/136011-circle-involute-solving-y-any-given-x.html

function involute_intersect_angle (base_radius, radius) = sqrt (pow (radius/base_radius, 2) - 1) * 180 / pi;

// Calculate the involute position for a given base radius and involute angle.

function rotated_involute (rotate, base_radius, involute_angle) =
[
	cos (rotate) * involute (base_radius, involute_angle)[0] + sin (rotate) * involute (base_radius, involute_angle)[1],
	cos (rotate) * involute (base_radius, involute_angle)[1] - sin (rotate) * involute (base_radius, involute_angle)[0]
];

function mirror_point (coord) =
[
	coord[0],
	-coord[1]
];

function rotate_point (rotate, coord) =
[
	cos (rotate) * coord[0] + sin (rotate) * coord[1],
	cos (rotate) * coord[1] - sin (rotate) * coord[0]
];

function involute (base_radius, involute_angle) =
[
	base_radius*(cos (involute_angle) + involute_angle*pi/180*sin (involute_angle)),
	base_radius*(sin (involute_angle) - involute_angle*pi/180*cos (involute_angle))
];


// Test Cases
//===============

module test_gears()
{
	translate([17,-15])
	{
		gear (number_of_teeth=17,
			circular_pitch=500,
			circles=8);

		rotate ([0,0,360*4/17])
		translate ([39.088888,0,0])
		{
			gear (number_of_teeth=11,
				circular_pitch=500,
				hub_diameter=0,
				rim_width=65);
			translate ([0,0,8])
			{
				gear (number_of_teeth=6,
					circular_pitch=300,
					hub_diameter=0,
					rim_width=5,
					rim_thickness=6,
					pressure_angle=31);
				rotate ([0,0,360*5/6])
				translate ([22.5,0,1])
				gear (number_of_teeth=21,
					circular_pitch=300,
					bore_diameter=2,
					hub_diameter=4,
					rim_width=1,
					hub_thickness=4,
					rim_thickness=4,
					gear_thickness=3,
					pressure_angle=31);
			}
		}

		translate ([-61.1111111,0,0])
		{
			gear (number_of_teeth=27,
				circular_pitch=500,
				circles=5,
				hub_diameter=2*8.88888889);

			translate ([-37.5,0,0])
			rotate ([0,0,-90])
			rack (
				circular_pitch=500
			     );

			translate ([0,0,10])
			{
				gear (
					number_of_teeth=14,
					circular_pitch=200,
					pressure_angle=5,
					clearance = 0.2,
					gear_thickness = 10,
					rim_thickness = 10,
					rim_width = 15,
					bore_diameter=5,
					circles=0);
				translate ([13.8888888,0,1])
				gear (
					number_of_teeth=11,
					circular_pitch=200,
					pressure_angle=5,
					clearance = 0.2,
					gear_thickness = 10,
					rim_thickness = 10,
					rim_width = 15,
					hub_thickness = 20,
					hub_diameter=2*7.222222,
					bore_diameter=5,
					circles=0);
			}
		}

		rotate ([0,0,360*-5/17])
		translate ([44.444444444,0,0])
		gear (number_of_teeth=15,
			circular_pitch=500,
			hub_diameter=10,
			rim_width=5,
			rim_thickness=5,
			gear_thickness=4,
			hub_thickness=6,
			circles=9);

		rotate ([0,0,360*-1/17])
		translate ([30.5555555,0,-1])
		gear (number_of_teeth=5,
			circular_pitch=500,
			hub_diameter=0,
			rim_width=5,
			rim_thickness=10);
	}
}

module meshing_double_helix ()
{
	test_double_helix_gear ();

	mirror ([0,1,0])
	translate ([58.33333333,0,0])
	test_double_helix_gear (teeth=13,circles=6);
}

module test_double_helix_gear (
	teeth=17,
	circles=8)
{
	//double helical gear
	{
		twist=200;
		height=20;
		pressure_angle=30;

		gear (number_of_teeth=teeth,
			circular_pitch=700,
			pressure_angle=pressure_angle,
			clearance = 0.2,
			gear_thickness = height/2*0.5,
			rim_thickness = height/2,
			rim_width = 5,
			hub_thickness = height/2*1.2,
			hub_diameter=15,
			bore_diameter=5,
			circles=circles,
			twist=twist/teeth);
		mirror([0,0,1])
		gear (number_of_teeth=teeth,
			circular_pitch=700,
			pressure_angle=pressure_angle,
			clearance = 0.2,
			gear_thickness = height/2,
			rim_thickness = height/2,
			rim_width = 5,
			hub_thickness = height/2,
			hub_diameter=15,
			bore_diameter=5,
			circles=circles,
			twist=twist/teeth);
	}
}

module test_backlash ()
{
	backlash = 2;
	teeth = 15;

	translate ([-29.166666,0,0])
	{
		translate ([58.3333333,0,0])
		rotate ([0,0,-360/teeth/4])
		gear (
			number_of_teeth = teeth,
			circular_pitch=700,
			gear_thickness = 12,
			rim_thickness = 15,
			rim_width = 5,
			hub_thickness = 17,
			hub_diameter=15,
			bore_diameter=5,
			backlash = 2,
			circles=8);

		rotate ([0,0,360/teeth/4])
		gear (
			number_of_teeth = teeth,
			circular_pitch=700,
			gear_thickness = 12,
			rim_thickness = 15,
			rim_width = 5,
			hub_thickness = 17,
			hub_diameter=15,
			bore_diameter=5,
			backlash = 2,
			circles=8);
	}

	color([0,0,128,0.5])
	translate([0,0,-5])
	cylinder ($fn=20,r=backlash / 4,h=25);
}
